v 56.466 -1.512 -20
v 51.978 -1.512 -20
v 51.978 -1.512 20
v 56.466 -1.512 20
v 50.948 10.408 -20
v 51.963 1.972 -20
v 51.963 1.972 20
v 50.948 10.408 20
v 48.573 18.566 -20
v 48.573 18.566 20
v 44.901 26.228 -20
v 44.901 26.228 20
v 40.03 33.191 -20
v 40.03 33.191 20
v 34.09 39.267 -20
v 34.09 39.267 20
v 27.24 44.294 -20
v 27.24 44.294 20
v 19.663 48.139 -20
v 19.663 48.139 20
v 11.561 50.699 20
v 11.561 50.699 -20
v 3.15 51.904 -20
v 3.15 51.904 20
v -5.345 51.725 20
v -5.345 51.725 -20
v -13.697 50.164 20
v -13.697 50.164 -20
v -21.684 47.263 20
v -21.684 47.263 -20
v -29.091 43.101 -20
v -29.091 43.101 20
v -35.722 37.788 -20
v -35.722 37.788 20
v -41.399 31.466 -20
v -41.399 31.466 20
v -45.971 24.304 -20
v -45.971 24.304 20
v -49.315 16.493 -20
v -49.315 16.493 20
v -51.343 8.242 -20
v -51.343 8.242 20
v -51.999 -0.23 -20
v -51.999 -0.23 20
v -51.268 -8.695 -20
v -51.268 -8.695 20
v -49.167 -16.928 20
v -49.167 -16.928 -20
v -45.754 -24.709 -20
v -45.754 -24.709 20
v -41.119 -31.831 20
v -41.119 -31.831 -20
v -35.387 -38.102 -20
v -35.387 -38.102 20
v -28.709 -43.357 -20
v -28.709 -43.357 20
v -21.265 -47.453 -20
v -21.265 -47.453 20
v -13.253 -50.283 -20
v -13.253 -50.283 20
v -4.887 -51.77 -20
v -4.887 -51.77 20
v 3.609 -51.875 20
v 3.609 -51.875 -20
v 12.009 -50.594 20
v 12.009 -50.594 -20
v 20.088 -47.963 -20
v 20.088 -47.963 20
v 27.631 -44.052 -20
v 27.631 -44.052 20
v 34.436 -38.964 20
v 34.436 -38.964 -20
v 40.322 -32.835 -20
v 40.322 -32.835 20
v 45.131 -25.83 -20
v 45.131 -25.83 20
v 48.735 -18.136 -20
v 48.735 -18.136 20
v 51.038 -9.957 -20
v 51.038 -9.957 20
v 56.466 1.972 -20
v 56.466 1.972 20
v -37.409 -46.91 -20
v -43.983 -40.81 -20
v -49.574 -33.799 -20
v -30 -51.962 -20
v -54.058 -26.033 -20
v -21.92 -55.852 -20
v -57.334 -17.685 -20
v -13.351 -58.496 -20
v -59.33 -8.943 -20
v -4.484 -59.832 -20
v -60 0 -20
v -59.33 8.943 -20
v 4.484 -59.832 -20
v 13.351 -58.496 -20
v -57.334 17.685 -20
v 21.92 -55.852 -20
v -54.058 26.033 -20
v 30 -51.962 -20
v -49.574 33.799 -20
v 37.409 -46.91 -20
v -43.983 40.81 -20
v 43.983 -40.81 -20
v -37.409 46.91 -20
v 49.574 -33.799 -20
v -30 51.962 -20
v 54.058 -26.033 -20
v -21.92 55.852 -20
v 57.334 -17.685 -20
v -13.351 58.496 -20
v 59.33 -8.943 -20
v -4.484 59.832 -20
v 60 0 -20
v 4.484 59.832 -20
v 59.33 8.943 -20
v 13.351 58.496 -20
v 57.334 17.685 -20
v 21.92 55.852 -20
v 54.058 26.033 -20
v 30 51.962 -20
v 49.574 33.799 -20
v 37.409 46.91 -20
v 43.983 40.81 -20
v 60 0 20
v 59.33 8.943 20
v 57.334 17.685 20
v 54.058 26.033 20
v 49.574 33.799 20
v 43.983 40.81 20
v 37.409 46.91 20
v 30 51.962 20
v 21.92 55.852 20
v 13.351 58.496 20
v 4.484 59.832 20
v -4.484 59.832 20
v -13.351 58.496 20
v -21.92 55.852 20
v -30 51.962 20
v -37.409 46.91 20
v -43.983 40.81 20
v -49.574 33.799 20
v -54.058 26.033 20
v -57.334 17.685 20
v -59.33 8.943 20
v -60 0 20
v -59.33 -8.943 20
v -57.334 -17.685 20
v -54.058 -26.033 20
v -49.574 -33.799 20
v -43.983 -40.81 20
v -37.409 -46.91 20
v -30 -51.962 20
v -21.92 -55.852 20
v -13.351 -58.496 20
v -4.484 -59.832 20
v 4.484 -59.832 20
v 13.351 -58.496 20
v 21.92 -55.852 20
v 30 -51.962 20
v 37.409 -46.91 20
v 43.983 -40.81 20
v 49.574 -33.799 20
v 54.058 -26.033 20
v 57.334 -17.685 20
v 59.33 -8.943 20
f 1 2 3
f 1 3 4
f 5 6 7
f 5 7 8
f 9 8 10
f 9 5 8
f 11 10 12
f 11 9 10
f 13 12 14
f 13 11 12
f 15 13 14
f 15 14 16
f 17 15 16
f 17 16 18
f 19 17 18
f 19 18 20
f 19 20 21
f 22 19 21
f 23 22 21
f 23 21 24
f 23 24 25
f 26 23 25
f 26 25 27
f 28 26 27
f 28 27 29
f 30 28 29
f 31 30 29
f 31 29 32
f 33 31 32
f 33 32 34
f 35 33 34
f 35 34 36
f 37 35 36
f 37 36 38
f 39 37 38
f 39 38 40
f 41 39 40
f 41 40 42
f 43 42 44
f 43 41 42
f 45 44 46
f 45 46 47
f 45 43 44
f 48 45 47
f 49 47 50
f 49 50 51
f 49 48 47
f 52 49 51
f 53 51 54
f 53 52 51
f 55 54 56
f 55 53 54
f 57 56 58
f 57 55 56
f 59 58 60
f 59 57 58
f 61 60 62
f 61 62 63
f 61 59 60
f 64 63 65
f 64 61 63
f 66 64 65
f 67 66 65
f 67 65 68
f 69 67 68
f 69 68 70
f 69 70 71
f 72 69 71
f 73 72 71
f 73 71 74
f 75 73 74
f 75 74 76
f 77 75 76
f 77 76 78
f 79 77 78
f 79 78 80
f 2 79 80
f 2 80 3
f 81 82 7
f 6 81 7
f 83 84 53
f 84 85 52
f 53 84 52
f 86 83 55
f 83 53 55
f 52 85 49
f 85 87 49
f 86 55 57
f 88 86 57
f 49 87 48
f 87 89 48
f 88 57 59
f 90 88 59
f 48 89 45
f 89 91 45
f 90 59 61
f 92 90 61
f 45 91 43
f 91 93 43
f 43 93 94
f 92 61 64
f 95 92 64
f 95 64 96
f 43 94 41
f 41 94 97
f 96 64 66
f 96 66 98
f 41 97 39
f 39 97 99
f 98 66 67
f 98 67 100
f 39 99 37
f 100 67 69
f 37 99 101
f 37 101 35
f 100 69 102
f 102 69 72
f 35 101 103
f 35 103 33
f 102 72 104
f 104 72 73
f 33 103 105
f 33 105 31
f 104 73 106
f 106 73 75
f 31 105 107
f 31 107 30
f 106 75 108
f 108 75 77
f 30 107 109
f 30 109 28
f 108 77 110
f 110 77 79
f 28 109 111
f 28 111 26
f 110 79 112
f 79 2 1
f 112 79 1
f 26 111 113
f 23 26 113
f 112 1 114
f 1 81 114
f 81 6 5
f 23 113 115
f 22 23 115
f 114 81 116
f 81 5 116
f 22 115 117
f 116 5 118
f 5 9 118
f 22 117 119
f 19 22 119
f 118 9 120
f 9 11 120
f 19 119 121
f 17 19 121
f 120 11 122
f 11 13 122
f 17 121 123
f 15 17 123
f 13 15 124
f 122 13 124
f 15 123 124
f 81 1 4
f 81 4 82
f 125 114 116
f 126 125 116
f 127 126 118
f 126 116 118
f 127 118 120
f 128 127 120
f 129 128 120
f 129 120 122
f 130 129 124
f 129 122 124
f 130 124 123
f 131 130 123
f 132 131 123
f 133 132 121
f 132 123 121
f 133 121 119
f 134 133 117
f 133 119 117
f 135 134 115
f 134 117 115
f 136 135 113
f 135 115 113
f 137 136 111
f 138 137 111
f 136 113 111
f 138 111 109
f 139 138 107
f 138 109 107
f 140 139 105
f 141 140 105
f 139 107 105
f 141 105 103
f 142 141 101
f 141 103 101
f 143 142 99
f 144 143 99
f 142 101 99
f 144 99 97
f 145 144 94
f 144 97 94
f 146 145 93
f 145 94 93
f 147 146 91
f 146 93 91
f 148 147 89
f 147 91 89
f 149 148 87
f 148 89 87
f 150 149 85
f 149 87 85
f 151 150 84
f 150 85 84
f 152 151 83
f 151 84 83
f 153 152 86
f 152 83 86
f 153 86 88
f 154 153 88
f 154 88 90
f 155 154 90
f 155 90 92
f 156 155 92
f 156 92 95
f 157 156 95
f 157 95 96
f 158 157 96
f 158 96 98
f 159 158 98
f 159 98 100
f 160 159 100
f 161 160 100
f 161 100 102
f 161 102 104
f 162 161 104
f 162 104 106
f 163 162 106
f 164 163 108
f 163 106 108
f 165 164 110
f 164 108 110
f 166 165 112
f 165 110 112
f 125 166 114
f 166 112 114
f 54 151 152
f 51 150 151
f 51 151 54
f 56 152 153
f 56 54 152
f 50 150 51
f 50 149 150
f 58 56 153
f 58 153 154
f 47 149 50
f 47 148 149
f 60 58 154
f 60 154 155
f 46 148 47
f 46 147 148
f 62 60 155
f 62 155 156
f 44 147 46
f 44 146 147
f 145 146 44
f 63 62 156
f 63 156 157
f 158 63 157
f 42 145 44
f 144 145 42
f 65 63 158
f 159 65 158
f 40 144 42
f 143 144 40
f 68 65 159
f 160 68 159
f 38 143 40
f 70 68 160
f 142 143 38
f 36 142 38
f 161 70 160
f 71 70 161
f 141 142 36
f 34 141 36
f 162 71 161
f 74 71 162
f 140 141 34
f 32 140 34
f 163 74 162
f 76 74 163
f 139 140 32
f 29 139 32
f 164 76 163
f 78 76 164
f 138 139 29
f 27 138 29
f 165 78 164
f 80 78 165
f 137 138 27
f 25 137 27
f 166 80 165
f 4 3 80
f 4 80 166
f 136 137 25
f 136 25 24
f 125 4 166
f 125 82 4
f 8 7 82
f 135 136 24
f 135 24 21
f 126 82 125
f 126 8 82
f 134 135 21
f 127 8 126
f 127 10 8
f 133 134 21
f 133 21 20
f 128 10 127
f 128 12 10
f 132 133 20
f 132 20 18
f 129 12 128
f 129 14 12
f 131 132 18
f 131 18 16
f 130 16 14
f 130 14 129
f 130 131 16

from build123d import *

# Parameters (mm, degrees)
BOSS_EXTRUDE1_DEPTH      = 20
BOSS_EXTRUDE1_DEPTH_BACK = 20
SKETCH1_R                = 60
SKETCH1_R_2              = 52
CUT_EXTRUDE1_DEPTH       = 20
CUT_EXTRUDE1_DEPTH_BACK  = 20


with BuildPart() as part:
    # Sketch1 → Boss-Extrude1 (new, two sides: drawn at the far end of the back side and taken through both)
    with BuildSketch(Plane.XY.offset(-BOSS_EXTRUDE1_DEPTH_BACK)):
        Circle(SKETCH1_R)
        Circle(SKETCH1_R_2, mode=Mode.SUBTRACT)
    extrude(amount=BOSS_EXTRUDE1_DEPTH + BOSS_EXTRUDE1_DEPTH_BACK)

    # Sketch2 → Cut-Extrude1 (cut, two sides: drawn at the far end of the back side and taken through both)
    with BuildSketch(Plane.XY.offset(-CUT_EXTRUDE1_DEPTH_BACK)):
        Polygon((51.978001404, -1.512405375), (56.465581727, -1.512405375), (56.465581727, 1.971821564), (51.962601164, 1.971821564), align=None)
    extrude(amount=CUT_EXTRUDE1_DEPTH + CUT_EXTRUDE1_DEPTH_BACK, mode=Mode.SUBTRACT)


solid = part.part
